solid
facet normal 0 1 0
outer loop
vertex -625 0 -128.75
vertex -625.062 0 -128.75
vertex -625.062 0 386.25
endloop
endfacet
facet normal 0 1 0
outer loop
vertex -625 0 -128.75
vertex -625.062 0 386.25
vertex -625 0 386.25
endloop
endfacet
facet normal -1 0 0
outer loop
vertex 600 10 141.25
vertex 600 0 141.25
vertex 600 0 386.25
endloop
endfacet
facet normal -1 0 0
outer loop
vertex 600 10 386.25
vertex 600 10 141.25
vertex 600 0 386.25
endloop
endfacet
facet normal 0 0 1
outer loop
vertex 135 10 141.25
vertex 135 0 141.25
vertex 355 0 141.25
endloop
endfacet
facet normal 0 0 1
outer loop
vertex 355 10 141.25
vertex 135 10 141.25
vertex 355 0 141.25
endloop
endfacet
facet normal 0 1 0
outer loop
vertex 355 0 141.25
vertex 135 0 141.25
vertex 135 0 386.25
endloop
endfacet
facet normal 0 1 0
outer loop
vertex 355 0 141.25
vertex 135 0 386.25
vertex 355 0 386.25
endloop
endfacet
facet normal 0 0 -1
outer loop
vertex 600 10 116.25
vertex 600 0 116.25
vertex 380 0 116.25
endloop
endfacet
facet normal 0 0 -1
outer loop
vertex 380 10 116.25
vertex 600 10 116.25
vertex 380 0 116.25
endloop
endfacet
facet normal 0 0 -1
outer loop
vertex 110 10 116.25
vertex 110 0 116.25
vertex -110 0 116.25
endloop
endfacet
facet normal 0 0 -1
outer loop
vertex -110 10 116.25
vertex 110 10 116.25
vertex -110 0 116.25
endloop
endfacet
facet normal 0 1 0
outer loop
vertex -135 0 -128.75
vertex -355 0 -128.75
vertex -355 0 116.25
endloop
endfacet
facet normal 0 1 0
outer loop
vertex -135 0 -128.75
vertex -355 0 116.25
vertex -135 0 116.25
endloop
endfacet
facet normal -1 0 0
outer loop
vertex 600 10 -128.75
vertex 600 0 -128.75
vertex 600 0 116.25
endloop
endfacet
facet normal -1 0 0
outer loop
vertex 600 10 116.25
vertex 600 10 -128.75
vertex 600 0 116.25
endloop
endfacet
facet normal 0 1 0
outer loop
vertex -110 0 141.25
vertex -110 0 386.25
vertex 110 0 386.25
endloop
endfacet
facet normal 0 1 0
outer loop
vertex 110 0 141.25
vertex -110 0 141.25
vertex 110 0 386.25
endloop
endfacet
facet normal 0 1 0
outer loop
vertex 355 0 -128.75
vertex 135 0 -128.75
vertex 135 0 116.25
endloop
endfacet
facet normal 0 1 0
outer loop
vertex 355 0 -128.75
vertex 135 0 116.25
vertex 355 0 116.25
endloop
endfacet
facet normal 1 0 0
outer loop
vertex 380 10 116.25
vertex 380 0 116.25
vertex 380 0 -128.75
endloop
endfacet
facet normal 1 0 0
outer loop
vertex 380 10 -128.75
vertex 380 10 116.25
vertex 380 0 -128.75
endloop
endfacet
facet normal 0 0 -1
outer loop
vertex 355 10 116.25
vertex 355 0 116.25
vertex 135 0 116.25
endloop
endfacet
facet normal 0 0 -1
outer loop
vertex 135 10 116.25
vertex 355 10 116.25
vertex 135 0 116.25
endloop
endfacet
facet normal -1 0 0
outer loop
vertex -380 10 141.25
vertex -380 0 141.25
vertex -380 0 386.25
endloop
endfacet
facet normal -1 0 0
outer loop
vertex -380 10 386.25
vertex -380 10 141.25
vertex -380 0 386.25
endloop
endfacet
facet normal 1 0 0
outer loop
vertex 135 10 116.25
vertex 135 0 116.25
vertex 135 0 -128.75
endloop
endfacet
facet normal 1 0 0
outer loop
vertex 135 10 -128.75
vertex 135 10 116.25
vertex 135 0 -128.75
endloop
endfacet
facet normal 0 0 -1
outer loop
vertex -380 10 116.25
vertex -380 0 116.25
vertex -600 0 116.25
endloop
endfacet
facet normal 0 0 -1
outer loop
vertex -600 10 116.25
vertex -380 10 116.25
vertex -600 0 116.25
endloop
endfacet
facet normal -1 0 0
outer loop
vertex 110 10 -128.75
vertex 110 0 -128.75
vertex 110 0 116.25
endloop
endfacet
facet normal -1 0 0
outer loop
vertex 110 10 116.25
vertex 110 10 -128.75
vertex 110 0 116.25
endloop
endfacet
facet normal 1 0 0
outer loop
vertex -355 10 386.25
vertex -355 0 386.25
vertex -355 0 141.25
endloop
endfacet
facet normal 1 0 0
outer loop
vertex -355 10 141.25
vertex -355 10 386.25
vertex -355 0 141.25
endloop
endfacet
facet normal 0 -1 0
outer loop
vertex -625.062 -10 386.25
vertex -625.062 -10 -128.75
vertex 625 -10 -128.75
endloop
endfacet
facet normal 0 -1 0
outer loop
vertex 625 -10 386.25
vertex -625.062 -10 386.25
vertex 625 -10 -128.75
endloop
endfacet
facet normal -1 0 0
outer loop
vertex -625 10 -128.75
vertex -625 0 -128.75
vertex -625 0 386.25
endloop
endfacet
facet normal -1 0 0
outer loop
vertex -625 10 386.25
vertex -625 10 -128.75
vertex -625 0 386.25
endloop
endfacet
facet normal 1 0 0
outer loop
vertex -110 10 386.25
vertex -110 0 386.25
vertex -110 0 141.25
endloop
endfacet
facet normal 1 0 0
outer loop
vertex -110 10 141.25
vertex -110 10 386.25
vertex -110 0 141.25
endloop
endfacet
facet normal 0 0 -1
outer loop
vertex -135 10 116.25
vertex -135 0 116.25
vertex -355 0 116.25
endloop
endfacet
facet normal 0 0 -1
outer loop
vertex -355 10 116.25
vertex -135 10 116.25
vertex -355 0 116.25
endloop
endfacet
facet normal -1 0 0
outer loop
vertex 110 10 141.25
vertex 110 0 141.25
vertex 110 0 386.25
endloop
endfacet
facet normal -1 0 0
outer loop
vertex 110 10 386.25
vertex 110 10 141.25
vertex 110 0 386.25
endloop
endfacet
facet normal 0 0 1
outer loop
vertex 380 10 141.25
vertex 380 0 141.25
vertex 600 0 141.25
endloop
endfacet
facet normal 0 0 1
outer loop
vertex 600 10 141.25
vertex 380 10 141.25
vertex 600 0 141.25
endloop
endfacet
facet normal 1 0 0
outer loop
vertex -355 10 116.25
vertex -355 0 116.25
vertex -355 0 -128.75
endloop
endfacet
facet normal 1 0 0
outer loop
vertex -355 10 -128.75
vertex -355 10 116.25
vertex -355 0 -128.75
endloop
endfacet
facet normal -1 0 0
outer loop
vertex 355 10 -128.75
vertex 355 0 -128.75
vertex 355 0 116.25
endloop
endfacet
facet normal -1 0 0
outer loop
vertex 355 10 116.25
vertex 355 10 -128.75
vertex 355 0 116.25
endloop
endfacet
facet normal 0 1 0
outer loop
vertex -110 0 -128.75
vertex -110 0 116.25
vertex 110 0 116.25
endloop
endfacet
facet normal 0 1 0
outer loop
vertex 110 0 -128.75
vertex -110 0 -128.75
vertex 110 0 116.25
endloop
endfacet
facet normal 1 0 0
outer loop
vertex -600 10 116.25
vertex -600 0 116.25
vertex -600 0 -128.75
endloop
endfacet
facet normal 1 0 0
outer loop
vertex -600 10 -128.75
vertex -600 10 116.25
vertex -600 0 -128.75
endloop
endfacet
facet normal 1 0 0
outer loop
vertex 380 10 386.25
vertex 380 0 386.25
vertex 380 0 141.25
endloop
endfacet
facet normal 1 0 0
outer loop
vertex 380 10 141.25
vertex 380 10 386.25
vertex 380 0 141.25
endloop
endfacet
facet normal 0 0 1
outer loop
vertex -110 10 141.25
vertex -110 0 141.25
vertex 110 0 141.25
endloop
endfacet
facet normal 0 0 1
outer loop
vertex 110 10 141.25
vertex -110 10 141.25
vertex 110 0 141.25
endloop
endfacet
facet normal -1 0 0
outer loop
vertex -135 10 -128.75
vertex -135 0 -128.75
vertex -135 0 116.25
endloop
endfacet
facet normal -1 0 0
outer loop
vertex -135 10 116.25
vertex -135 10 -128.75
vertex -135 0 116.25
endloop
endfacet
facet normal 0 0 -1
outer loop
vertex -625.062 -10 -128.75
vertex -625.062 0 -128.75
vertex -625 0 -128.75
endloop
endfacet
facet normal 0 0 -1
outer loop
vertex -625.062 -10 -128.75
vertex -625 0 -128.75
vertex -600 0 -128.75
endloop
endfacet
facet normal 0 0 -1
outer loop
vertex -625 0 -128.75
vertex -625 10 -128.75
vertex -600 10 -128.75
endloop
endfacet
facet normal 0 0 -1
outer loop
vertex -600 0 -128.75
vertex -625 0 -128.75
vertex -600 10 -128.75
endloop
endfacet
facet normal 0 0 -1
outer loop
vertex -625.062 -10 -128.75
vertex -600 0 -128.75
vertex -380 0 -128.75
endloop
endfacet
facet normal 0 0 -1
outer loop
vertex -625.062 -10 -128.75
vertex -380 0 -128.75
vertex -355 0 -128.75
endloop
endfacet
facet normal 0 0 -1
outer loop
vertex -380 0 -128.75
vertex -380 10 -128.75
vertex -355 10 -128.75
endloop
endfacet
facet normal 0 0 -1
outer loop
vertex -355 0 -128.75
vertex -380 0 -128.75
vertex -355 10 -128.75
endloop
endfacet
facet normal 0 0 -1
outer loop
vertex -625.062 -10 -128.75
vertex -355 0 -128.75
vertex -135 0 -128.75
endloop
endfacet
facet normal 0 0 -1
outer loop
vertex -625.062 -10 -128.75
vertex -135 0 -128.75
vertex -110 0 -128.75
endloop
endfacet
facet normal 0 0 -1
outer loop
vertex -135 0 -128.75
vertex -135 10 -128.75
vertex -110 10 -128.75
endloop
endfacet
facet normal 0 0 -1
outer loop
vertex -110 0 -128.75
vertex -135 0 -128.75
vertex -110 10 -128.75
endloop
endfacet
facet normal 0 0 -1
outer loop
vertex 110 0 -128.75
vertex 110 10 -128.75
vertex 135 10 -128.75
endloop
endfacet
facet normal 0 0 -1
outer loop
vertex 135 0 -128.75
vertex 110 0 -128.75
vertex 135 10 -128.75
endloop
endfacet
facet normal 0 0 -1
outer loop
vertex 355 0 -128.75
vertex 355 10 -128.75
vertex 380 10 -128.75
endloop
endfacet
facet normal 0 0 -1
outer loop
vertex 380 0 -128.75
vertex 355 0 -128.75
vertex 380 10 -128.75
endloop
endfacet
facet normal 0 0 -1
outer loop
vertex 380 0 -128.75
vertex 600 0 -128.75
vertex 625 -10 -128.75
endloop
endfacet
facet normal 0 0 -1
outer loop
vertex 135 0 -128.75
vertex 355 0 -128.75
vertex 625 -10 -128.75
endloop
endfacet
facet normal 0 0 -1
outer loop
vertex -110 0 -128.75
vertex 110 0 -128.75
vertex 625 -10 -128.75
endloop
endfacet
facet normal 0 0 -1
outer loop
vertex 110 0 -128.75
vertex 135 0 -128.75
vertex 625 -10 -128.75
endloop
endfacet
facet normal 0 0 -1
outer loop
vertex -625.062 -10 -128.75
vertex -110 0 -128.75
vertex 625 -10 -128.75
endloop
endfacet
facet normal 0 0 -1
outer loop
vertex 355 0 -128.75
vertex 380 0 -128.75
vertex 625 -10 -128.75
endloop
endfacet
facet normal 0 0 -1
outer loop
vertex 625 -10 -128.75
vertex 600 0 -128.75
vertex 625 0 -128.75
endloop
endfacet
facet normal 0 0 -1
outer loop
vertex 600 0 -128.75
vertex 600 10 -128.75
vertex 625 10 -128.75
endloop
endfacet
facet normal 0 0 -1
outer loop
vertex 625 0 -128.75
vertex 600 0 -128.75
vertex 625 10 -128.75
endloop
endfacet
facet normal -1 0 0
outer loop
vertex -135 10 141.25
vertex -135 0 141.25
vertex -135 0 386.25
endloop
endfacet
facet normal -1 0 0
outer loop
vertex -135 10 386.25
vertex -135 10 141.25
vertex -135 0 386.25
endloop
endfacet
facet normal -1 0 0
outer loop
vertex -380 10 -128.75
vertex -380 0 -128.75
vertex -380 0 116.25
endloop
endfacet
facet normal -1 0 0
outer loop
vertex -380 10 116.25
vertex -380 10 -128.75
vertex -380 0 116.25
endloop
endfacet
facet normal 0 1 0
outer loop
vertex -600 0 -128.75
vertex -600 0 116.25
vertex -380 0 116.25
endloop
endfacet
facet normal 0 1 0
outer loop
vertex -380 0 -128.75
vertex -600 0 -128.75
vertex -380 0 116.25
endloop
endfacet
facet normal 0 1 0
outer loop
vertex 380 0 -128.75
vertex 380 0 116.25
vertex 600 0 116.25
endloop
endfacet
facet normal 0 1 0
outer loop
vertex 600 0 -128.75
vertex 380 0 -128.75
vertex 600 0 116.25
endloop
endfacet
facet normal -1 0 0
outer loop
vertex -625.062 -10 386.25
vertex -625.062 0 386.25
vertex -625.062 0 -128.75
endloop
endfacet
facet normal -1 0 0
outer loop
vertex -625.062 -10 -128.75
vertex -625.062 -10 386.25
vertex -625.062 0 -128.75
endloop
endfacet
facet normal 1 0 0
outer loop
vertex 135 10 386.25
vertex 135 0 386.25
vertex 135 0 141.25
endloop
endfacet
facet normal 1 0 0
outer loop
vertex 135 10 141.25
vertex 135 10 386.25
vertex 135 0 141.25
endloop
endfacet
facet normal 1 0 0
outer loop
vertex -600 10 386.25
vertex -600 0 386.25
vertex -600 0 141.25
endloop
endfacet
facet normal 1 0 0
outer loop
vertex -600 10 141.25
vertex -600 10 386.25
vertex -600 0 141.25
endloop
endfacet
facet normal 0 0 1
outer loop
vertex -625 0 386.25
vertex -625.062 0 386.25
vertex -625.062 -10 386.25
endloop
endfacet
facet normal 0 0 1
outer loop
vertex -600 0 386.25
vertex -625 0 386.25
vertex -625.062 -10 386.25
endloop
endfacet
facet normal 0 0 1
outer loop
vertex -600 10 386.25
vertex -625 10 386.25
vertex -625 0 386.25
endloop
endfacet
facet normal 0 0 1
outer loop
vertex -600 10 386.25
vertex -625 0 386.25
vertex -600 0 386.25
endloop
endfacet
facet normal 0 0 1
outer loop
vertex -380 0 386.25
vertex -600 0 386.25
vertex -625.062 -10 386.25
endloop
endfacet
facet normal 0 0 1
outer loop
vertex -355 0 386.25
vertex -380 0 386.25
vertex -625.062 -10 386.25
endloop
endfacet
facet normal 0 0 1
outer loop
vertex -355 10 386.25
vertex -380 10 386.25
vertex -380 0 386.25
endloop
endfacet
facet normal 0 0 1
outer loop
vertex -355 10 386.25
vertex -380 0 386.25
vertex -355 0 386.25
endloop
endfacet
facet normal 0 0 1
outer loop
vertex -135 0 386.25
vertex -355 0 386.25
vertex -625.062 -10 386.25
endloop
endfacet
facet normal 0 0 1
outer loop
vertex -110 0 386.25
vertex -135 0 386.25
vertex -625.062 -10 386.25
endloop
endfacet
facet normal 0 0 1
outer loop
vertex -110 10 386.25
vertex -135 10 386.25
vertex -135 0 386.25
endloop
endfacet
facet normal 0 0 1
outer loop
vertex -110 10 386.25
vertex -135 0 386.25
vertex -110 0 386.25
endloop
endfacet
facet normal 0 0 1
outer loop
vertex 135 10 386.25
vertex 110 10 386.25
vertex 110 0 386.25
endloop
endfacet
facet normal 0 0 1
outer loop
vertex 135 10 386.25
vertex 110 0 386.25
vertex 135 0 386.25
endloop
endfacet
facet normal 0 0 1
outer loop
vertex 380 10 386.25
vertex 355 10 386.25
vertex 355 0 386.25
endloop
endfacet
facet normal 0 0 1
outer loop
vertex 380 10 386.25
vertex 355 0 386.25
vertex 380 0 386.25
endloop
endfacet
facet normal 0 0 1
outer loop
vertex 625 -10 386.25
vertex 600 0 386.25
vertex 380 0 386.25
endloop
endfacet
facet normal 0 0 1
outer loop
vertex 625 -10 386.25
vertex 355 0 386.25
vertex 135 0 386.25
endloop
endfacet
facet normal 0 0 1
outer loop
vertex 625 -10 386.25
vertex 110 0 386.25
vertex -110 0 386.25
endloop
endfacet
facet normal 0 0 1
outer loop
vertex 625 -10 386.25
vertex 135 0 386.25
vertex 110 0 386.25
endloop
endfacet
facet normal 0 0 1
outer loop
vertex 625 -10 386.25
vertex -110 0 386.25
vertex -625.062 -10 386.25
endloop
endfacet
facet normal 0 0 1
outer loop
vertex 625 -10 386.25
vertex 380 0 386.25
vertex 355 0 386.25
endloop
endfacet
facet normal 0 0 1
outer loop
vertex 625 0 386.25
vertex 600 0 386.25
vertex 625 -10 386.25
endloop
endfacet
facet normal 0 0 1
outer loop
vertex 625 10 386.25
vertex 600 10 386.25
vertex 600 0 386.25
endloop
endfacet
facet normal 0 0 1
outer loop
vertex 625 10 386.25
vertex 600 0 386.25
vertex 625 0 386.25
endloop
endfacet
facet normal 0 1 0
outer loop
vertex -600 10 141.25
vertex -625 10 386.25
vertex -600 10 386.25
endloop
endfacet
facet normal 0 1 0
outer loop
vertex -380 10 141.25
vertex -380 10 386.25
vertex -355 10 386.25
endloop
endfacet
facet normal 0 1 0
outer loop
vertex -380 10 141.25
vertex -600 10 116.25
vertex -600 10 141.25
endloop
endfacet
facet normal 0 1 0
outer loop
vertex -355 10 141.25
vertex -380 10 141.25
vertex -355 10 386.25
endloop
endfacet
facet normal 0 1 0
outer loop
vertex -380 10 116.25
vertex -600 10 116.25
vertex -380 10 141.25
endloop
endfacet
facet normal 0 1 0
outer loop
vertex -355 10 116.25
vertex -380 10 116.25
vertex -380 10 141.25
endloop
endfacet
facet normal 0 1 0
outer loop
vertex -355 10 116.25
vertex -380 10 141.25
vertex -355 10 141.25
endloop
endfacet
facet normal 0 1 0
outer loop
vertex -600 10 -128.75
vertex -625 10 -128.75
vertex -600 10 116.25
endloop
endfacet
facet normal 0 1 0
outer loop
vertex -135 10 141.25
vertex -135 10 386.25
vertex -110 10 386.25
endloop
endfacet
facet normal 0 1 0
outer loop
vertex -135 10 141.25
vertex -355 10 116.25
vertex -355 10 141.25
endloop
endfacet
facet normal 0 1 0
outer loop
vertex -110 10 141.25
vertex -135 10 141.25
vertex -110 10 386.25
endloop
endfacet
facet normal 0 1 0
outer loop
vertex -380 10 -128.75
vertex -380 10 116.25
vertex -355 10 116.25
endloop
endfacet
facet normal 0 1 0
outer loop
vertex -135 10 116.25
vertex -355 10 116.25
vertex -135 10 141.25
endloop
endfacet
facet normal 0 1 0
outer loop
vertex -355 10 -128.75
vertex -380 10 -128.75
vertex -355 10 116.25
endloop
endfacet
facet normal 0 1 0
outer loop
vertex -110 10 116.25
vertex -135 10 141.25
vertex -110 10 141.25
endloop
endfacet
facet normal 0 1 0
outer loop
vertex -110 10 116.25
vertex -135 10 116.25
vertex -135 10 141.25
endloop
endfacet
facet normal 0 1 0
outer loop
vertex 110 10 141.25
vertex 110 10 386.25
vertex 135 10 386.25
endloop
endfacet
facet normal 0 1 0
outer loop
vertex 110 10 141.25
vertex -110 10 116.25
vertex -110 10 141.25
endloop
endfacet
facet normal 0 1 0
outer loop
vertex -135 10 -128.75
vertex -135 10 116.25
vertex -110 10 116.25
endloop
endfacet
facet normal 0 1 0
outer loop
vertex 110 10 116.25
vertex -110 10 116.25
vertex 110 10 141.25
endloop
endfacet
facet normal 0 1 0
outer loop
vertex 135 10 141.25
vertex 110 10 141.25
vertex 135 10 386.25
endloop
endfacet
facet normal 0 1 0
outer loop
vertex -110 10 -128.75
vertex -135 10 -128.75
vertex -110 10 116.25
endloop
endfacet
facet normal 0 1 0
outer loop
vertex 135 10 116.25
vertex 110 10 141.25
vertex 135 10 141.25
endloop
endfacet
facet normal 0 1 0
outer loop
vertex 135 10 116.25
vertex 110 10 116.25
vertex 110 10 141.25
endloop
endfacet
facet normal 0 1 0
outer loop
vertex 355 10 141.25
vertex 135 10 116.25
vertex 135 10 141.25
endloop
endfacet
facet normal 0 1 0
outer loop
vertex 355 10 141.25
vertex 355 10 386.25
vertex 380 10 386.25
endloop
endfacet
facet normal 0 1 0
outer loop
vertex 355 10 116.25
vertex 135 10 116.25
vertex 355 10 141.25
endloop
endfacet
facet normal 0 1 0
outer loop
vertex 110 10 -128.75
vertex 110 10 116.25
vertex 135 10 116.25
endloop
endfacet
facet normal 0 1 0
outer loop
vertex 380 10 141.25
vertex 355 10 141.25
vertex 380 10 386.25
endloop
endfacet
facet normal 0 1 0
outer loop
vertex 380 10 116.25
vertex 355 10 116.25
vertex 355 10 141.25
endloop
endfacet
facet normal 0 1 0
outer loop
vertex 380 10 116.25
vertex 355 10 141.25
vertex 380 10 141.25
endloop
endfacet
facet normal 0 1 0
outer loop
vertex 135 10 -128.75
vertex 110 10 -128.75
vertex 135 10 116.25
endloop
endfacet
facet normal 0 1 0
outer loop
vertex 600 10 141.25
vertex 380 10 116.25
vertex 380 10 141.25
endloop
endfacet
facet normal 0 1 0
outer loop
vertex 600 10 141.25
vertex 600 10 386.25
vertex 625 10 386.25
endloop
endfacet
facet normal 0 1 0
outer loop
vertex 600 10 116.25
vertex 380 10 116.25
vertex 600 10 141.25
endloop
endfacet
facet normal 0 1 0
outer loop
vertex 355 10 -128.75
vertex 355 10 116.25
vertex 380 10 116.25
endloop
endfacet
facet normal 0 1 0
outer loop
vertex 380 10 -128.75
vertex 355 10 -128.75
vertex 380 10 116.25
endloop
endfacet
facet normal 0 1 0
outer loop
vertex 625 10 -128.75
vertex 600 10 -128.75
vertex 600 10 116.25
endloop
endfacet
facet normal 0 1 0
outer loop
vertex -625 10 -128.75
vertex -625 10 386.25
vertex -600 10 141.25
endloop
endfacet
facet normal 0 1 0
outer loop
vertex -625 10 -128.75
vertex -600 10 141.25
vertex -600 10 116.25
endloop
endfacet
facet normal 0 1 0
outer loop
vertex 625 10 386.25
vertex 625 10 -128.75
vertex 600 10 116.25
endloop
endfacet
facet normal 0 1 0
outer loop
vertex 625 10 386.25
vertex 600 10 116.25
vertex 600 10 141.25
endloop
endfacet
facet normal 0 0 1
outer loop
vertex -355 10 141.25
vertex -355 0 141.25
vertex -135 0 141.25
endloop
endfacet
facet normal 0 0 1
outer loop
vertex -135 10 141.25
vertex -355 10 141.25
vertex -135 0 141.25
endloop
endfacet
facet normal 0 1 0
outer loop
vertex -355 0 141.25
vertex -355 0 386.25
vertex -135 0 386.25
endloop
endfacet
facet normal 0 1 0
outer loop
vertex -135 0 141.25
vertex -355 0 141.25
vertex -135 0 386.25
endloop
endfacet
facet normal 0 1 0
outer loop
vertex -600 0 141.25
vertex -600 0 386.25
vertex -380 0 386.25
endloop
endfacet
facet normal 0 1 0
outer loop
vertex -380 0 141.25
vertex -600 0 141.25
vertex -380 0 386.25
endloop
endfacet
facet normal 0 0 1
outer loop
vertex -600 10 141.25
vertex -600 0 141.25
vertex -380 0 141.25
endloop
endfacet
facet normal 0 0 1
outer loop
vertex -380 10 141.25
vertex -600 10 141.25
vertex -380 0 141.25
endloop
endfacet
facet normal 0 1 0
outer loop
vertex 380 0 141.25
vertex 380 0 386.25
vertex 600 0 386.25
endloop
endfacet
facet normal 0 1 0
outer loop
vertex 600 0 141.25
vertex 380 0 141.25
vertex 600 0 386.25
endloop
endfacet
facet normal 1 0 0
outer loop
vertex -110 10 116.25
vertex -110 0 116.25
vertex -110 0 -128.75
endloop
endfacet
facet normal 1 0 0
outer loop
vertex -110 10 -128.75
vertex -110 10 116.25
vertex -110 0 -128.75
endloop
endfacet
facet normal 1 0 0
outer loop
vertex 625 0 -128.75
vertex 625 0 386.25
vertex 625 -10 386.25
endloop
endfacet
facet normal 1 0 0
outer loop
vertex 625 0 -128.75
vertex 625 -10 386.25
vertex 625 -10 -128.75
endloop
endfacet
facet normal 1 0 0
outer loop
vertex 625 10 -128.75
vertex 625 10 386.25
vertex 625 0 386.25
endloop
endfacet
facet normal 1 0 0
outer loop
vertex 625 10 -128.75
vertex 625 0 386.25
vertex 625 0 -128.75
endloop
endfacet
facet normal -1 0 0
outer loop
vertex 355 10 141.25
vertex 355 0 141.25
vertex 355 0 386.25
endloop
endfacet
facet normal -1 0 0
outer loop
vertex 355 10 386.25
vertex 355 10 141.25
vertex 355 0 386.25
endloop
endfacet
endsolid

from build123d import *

# Parameters (mm, degrees)
BOSS_EXTRUDE1_DEPTH = 10
SKETCH2_W           = 1250.061929379
SKETCH2_H           = 515
BOSS_EXTRUDE2_DEPTH = 10


with BuildPart() as part:
    # Sketch1 → Boss-Extrude1 (new body)
    with BuildSketch(Plane(origin=(0, 0, 0), x_dir=(1, 0, 0), z_dir=(0, 1, 0))):
        Polygon((-110, 128.75), (-135, 128.75), (-135, -116.25), (-355, -116.25), (-355, 128.75), (-380, 128.75), (-380, -116.25), (-600, -116.25), (-600, 128.75), (-625, 128.75), (-625, -386.25), (-600, -386.25), (-600, -141.25), (-380, -141.25), (-380, -386.25), (-355, -386.25), (-355, -141.25), (-135, -141.25), (-135, -386.25), (-110, -386.25), (-110, -141.25), (110, -141.25), (110, -386.25), (135, -386.25), (135, -141.25), (355, -141.25), (355, -386.25), (380, -386.25), (380, -141.25), (600, -141.25), (600, -386.25), (625, -386.25), (625, 128.75), (600, 128.75), (600, -116.25), (380, -116.25), (380, 128.75), (355, 128.75), (355, -116.25), (135, -116.25), (135, 128.75), (110, 128.75), (110, -116.25), (-110, -116.25), align=None)
    extrude(amount=BOSS_EXTRUDE1_DEPTH)

    # Sketch2 → Boss-Extrude2 (add)
    with BuildSketch(Plane(origin=(0, 0, 0), x_dir=(1, 0, 0), z_dir=(0, 1, 0))):
        with Locations((-0.03096469, -128.75)):
            Rectangle(SKETCH2_W, SKETCH2_H)
    extrude(amount=-BOSS_EXTRUDE2_DEPTH)


solid = part.part
